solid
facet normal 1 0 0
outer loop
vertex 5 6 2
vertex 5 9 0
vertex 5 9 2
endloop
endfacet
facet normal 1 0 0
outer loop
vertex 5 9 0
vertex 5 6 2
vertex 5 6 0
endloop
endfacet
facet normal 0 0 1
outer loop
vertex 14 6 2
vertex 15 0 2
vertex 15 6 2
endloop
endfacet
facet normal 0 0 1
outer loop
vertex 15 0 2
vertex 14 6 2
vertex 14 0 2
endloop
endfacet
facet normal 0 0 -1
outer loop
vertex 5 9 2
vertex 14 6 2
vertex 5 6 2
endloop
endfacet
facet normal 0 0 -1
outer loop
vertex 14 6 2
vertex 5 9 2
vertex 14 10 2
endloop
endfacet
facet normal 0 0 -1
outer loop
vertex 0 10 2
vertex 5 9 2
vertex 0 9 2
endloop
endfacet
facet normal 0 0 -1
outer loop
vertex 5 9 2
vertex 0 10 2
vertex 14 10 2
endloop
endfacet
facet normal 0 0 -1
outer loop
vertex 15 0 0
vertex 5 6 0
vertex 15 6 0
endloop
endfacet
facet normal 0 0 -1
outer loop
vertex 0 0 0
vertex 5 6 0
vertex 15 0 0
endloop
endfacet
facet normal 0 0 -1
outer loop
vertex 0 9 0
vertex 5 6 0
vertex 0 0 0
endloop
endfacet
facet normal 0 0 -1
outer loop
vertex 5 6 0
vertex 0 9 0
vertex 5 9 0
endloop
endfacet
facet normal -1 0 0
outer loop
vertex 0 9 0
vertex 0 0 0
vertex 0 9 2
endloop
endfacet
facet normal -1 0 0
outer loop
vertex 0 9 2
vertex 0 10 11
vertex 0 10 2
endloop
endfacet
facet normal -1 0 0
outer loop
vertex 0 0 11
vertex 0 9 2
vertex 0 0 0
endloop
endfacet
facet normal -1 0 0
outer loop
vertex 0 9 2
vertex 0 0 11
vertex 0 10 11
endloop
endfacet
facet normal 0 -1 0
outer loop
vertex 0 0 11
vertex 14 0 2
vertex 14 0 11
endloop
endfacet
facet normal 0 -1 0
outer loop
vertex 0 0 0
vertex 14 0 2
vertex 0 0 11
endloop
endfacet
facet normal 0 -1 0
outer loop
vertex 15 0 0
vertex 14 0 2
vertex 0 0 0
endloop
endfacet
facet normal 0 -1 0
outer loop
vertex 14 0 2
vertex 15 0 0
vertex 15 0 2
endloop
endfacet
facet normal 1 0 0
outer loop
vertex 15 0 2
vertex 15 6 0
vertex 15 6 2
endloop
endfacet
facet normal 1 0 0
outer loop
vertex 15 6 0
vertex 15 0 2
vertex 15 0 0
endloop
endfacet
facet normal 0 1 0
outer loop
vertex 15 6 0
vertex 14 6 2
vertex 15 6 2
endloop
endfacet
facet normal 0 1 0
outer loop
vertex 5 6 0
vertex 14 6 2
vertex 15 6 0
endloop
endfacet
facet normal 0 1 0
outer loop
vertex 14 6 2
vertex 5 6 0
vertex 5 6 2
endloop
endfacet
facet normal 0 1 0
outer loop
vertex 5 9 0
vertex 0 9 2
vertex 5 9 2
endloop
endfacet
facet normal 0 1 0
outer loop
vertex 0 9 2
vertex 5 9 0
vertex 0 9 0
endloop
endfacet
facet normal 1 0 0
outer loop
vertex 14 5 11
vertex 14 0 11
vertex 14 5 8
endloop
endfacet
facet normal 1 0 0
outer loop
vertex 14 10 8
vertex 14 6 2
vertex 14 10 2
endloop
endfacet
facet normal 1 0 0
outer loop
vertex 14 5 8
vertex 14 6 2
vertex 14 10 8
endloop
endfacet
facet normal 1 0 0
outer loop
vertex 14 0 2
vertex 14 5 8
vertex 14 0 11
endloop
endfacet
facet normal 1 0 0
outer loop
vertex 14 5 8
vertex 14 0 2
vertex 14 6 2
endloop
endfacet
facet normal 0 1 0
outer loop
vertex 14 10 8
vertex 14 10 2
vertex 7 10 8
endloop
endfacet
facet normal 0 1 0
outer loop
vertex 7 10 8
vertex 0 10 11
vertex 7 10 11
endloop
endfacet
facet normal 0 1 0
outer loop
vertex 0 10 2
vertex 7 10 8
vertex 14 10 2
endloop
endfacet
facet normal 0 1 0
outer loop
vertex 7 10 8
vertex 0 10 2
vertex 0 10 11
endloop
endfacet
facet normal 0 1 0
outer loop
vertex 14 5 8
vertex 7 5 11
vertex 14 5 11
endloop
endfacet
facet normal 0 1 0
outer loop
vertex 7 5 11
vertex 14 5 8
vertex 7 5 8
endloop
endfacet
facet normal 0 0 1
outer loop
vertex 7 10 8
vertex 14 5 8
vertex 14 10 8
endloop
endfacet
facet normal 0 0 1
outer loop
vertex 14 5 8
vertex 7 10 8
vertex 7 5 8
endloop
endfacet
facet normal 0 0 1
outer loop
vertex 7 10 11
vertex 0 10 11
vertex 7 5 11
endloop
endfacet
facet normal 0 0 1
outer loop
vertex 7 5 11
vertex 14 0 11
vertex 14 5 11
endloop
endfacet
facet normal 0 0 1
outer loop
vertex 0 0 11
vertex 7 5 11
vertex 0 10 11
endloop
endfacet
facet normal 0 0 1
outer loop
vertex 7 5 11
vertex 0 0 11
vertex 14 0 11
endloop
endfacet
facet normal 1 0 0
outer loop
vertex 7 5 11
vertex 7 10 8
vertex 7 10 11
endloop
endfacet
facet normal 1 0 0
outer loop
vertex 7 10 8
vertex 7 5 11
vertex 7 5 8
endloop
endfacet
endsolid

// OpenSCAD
translate([2.5, 1.5, 1.0]) color([0.7620005545284954, 0.06809296768032302, 0.8609410769469436]) cube([5, 3, 2], center=true);
translate([7.5, 1.5, 1.0]) color([0.2827478909480132, 0.13442052583382869, 0.5230599837537087]) cube([5, 3, 2], center=true);
translate([12.5, 1.5, 1.0]) color([0.21027834364306774, 0.10530639745894443, 0.9556548717215211]) cube([5, 3, 2], center=true);
translate([2.5, 4.5, 1.0]) color([0.5435731515542631, 0.7414270622920264, 0.9040457292510377]) cube([5, 3, 2], center=true);
translate([7.5, 4.5, 1.0]) color([0.2786145977098805, 0.4423646135017597, 0.5682329433322765]) cube([5, 3, 2], center=true);
translate([12.5, 4.5, 1.0]) color([0.13781274972163116, 0.1232982180791492, 0.12051785276403837]) cube([5, 3, 2], center=true);
translate([2.5, 7.5, 1.0]) color([0.4012165411640888, 0.4679428423906348, 0.5596131508667647]) cube([5, 3, 2], center=true);
translate([3.5, 2.5, 3.5]) color([0.29896126951320356, 0.6321114709426877, 0.7423454703026071]) cube([7, 5, 3], center=true);
translate([10.5, 2.5, 3.5]) color([0.21800995973285464, 0.48885816108208613, 0.501567157493831]) cube([7, 5, 3], center=true);
translate([3.5, 7.5, 3.5]) color([0.49271975198428686, 0.958422556968198, 0.44398175403613704]) cube([7, 5, 3], center=true);
translate([10.5, 7.5, 3.5]) color([0.14281143058247625, 0.4955231327742775, 0.8873352305676206]) cube([7, 5, 3], center=true);
translate([3.5, 2.5, 6.5]) color([0.21571394075115613, 0.3554013630116646, 0.39096604949642]) cube([7, 5, 3], center=true);
translate([10.5, 2.5, 6.5]) color([0.9928835035123682, 0.8462248334797323, 0.9789066021625461]) cube([7, 5, 3], center=true);
translate([3.5, 7.5, 6.5]) color([0.6868956228130294, 0.08137290691060206, 0.9493092651810784]) cube([7, 5, 3], center=true);
translate([10.5, 7.5, 6.5]) color([0.9246190463677613, 0.3951154575230438, 0.3612783181755085]) cube([7, 5, 3], center=true);
translate([3.5, 2.5, 9.5]) color([0.11615210489091876, 0.0037403702712440756, 0.2703277384724262]) cube([7, 5, 3], center=true);
translate([10.5, 2.5, 9.5]) color([0.6403732426441148, 0.29252642189785794, 0.9007258804640697]) cube([7, 5, 3], center=true);
translate([3.5, 7.5, 9.5]) color([0.14067978971908934, 0.5728503338092871, 0.1912043400515635]) cube([7, 5, 3], center=true);
